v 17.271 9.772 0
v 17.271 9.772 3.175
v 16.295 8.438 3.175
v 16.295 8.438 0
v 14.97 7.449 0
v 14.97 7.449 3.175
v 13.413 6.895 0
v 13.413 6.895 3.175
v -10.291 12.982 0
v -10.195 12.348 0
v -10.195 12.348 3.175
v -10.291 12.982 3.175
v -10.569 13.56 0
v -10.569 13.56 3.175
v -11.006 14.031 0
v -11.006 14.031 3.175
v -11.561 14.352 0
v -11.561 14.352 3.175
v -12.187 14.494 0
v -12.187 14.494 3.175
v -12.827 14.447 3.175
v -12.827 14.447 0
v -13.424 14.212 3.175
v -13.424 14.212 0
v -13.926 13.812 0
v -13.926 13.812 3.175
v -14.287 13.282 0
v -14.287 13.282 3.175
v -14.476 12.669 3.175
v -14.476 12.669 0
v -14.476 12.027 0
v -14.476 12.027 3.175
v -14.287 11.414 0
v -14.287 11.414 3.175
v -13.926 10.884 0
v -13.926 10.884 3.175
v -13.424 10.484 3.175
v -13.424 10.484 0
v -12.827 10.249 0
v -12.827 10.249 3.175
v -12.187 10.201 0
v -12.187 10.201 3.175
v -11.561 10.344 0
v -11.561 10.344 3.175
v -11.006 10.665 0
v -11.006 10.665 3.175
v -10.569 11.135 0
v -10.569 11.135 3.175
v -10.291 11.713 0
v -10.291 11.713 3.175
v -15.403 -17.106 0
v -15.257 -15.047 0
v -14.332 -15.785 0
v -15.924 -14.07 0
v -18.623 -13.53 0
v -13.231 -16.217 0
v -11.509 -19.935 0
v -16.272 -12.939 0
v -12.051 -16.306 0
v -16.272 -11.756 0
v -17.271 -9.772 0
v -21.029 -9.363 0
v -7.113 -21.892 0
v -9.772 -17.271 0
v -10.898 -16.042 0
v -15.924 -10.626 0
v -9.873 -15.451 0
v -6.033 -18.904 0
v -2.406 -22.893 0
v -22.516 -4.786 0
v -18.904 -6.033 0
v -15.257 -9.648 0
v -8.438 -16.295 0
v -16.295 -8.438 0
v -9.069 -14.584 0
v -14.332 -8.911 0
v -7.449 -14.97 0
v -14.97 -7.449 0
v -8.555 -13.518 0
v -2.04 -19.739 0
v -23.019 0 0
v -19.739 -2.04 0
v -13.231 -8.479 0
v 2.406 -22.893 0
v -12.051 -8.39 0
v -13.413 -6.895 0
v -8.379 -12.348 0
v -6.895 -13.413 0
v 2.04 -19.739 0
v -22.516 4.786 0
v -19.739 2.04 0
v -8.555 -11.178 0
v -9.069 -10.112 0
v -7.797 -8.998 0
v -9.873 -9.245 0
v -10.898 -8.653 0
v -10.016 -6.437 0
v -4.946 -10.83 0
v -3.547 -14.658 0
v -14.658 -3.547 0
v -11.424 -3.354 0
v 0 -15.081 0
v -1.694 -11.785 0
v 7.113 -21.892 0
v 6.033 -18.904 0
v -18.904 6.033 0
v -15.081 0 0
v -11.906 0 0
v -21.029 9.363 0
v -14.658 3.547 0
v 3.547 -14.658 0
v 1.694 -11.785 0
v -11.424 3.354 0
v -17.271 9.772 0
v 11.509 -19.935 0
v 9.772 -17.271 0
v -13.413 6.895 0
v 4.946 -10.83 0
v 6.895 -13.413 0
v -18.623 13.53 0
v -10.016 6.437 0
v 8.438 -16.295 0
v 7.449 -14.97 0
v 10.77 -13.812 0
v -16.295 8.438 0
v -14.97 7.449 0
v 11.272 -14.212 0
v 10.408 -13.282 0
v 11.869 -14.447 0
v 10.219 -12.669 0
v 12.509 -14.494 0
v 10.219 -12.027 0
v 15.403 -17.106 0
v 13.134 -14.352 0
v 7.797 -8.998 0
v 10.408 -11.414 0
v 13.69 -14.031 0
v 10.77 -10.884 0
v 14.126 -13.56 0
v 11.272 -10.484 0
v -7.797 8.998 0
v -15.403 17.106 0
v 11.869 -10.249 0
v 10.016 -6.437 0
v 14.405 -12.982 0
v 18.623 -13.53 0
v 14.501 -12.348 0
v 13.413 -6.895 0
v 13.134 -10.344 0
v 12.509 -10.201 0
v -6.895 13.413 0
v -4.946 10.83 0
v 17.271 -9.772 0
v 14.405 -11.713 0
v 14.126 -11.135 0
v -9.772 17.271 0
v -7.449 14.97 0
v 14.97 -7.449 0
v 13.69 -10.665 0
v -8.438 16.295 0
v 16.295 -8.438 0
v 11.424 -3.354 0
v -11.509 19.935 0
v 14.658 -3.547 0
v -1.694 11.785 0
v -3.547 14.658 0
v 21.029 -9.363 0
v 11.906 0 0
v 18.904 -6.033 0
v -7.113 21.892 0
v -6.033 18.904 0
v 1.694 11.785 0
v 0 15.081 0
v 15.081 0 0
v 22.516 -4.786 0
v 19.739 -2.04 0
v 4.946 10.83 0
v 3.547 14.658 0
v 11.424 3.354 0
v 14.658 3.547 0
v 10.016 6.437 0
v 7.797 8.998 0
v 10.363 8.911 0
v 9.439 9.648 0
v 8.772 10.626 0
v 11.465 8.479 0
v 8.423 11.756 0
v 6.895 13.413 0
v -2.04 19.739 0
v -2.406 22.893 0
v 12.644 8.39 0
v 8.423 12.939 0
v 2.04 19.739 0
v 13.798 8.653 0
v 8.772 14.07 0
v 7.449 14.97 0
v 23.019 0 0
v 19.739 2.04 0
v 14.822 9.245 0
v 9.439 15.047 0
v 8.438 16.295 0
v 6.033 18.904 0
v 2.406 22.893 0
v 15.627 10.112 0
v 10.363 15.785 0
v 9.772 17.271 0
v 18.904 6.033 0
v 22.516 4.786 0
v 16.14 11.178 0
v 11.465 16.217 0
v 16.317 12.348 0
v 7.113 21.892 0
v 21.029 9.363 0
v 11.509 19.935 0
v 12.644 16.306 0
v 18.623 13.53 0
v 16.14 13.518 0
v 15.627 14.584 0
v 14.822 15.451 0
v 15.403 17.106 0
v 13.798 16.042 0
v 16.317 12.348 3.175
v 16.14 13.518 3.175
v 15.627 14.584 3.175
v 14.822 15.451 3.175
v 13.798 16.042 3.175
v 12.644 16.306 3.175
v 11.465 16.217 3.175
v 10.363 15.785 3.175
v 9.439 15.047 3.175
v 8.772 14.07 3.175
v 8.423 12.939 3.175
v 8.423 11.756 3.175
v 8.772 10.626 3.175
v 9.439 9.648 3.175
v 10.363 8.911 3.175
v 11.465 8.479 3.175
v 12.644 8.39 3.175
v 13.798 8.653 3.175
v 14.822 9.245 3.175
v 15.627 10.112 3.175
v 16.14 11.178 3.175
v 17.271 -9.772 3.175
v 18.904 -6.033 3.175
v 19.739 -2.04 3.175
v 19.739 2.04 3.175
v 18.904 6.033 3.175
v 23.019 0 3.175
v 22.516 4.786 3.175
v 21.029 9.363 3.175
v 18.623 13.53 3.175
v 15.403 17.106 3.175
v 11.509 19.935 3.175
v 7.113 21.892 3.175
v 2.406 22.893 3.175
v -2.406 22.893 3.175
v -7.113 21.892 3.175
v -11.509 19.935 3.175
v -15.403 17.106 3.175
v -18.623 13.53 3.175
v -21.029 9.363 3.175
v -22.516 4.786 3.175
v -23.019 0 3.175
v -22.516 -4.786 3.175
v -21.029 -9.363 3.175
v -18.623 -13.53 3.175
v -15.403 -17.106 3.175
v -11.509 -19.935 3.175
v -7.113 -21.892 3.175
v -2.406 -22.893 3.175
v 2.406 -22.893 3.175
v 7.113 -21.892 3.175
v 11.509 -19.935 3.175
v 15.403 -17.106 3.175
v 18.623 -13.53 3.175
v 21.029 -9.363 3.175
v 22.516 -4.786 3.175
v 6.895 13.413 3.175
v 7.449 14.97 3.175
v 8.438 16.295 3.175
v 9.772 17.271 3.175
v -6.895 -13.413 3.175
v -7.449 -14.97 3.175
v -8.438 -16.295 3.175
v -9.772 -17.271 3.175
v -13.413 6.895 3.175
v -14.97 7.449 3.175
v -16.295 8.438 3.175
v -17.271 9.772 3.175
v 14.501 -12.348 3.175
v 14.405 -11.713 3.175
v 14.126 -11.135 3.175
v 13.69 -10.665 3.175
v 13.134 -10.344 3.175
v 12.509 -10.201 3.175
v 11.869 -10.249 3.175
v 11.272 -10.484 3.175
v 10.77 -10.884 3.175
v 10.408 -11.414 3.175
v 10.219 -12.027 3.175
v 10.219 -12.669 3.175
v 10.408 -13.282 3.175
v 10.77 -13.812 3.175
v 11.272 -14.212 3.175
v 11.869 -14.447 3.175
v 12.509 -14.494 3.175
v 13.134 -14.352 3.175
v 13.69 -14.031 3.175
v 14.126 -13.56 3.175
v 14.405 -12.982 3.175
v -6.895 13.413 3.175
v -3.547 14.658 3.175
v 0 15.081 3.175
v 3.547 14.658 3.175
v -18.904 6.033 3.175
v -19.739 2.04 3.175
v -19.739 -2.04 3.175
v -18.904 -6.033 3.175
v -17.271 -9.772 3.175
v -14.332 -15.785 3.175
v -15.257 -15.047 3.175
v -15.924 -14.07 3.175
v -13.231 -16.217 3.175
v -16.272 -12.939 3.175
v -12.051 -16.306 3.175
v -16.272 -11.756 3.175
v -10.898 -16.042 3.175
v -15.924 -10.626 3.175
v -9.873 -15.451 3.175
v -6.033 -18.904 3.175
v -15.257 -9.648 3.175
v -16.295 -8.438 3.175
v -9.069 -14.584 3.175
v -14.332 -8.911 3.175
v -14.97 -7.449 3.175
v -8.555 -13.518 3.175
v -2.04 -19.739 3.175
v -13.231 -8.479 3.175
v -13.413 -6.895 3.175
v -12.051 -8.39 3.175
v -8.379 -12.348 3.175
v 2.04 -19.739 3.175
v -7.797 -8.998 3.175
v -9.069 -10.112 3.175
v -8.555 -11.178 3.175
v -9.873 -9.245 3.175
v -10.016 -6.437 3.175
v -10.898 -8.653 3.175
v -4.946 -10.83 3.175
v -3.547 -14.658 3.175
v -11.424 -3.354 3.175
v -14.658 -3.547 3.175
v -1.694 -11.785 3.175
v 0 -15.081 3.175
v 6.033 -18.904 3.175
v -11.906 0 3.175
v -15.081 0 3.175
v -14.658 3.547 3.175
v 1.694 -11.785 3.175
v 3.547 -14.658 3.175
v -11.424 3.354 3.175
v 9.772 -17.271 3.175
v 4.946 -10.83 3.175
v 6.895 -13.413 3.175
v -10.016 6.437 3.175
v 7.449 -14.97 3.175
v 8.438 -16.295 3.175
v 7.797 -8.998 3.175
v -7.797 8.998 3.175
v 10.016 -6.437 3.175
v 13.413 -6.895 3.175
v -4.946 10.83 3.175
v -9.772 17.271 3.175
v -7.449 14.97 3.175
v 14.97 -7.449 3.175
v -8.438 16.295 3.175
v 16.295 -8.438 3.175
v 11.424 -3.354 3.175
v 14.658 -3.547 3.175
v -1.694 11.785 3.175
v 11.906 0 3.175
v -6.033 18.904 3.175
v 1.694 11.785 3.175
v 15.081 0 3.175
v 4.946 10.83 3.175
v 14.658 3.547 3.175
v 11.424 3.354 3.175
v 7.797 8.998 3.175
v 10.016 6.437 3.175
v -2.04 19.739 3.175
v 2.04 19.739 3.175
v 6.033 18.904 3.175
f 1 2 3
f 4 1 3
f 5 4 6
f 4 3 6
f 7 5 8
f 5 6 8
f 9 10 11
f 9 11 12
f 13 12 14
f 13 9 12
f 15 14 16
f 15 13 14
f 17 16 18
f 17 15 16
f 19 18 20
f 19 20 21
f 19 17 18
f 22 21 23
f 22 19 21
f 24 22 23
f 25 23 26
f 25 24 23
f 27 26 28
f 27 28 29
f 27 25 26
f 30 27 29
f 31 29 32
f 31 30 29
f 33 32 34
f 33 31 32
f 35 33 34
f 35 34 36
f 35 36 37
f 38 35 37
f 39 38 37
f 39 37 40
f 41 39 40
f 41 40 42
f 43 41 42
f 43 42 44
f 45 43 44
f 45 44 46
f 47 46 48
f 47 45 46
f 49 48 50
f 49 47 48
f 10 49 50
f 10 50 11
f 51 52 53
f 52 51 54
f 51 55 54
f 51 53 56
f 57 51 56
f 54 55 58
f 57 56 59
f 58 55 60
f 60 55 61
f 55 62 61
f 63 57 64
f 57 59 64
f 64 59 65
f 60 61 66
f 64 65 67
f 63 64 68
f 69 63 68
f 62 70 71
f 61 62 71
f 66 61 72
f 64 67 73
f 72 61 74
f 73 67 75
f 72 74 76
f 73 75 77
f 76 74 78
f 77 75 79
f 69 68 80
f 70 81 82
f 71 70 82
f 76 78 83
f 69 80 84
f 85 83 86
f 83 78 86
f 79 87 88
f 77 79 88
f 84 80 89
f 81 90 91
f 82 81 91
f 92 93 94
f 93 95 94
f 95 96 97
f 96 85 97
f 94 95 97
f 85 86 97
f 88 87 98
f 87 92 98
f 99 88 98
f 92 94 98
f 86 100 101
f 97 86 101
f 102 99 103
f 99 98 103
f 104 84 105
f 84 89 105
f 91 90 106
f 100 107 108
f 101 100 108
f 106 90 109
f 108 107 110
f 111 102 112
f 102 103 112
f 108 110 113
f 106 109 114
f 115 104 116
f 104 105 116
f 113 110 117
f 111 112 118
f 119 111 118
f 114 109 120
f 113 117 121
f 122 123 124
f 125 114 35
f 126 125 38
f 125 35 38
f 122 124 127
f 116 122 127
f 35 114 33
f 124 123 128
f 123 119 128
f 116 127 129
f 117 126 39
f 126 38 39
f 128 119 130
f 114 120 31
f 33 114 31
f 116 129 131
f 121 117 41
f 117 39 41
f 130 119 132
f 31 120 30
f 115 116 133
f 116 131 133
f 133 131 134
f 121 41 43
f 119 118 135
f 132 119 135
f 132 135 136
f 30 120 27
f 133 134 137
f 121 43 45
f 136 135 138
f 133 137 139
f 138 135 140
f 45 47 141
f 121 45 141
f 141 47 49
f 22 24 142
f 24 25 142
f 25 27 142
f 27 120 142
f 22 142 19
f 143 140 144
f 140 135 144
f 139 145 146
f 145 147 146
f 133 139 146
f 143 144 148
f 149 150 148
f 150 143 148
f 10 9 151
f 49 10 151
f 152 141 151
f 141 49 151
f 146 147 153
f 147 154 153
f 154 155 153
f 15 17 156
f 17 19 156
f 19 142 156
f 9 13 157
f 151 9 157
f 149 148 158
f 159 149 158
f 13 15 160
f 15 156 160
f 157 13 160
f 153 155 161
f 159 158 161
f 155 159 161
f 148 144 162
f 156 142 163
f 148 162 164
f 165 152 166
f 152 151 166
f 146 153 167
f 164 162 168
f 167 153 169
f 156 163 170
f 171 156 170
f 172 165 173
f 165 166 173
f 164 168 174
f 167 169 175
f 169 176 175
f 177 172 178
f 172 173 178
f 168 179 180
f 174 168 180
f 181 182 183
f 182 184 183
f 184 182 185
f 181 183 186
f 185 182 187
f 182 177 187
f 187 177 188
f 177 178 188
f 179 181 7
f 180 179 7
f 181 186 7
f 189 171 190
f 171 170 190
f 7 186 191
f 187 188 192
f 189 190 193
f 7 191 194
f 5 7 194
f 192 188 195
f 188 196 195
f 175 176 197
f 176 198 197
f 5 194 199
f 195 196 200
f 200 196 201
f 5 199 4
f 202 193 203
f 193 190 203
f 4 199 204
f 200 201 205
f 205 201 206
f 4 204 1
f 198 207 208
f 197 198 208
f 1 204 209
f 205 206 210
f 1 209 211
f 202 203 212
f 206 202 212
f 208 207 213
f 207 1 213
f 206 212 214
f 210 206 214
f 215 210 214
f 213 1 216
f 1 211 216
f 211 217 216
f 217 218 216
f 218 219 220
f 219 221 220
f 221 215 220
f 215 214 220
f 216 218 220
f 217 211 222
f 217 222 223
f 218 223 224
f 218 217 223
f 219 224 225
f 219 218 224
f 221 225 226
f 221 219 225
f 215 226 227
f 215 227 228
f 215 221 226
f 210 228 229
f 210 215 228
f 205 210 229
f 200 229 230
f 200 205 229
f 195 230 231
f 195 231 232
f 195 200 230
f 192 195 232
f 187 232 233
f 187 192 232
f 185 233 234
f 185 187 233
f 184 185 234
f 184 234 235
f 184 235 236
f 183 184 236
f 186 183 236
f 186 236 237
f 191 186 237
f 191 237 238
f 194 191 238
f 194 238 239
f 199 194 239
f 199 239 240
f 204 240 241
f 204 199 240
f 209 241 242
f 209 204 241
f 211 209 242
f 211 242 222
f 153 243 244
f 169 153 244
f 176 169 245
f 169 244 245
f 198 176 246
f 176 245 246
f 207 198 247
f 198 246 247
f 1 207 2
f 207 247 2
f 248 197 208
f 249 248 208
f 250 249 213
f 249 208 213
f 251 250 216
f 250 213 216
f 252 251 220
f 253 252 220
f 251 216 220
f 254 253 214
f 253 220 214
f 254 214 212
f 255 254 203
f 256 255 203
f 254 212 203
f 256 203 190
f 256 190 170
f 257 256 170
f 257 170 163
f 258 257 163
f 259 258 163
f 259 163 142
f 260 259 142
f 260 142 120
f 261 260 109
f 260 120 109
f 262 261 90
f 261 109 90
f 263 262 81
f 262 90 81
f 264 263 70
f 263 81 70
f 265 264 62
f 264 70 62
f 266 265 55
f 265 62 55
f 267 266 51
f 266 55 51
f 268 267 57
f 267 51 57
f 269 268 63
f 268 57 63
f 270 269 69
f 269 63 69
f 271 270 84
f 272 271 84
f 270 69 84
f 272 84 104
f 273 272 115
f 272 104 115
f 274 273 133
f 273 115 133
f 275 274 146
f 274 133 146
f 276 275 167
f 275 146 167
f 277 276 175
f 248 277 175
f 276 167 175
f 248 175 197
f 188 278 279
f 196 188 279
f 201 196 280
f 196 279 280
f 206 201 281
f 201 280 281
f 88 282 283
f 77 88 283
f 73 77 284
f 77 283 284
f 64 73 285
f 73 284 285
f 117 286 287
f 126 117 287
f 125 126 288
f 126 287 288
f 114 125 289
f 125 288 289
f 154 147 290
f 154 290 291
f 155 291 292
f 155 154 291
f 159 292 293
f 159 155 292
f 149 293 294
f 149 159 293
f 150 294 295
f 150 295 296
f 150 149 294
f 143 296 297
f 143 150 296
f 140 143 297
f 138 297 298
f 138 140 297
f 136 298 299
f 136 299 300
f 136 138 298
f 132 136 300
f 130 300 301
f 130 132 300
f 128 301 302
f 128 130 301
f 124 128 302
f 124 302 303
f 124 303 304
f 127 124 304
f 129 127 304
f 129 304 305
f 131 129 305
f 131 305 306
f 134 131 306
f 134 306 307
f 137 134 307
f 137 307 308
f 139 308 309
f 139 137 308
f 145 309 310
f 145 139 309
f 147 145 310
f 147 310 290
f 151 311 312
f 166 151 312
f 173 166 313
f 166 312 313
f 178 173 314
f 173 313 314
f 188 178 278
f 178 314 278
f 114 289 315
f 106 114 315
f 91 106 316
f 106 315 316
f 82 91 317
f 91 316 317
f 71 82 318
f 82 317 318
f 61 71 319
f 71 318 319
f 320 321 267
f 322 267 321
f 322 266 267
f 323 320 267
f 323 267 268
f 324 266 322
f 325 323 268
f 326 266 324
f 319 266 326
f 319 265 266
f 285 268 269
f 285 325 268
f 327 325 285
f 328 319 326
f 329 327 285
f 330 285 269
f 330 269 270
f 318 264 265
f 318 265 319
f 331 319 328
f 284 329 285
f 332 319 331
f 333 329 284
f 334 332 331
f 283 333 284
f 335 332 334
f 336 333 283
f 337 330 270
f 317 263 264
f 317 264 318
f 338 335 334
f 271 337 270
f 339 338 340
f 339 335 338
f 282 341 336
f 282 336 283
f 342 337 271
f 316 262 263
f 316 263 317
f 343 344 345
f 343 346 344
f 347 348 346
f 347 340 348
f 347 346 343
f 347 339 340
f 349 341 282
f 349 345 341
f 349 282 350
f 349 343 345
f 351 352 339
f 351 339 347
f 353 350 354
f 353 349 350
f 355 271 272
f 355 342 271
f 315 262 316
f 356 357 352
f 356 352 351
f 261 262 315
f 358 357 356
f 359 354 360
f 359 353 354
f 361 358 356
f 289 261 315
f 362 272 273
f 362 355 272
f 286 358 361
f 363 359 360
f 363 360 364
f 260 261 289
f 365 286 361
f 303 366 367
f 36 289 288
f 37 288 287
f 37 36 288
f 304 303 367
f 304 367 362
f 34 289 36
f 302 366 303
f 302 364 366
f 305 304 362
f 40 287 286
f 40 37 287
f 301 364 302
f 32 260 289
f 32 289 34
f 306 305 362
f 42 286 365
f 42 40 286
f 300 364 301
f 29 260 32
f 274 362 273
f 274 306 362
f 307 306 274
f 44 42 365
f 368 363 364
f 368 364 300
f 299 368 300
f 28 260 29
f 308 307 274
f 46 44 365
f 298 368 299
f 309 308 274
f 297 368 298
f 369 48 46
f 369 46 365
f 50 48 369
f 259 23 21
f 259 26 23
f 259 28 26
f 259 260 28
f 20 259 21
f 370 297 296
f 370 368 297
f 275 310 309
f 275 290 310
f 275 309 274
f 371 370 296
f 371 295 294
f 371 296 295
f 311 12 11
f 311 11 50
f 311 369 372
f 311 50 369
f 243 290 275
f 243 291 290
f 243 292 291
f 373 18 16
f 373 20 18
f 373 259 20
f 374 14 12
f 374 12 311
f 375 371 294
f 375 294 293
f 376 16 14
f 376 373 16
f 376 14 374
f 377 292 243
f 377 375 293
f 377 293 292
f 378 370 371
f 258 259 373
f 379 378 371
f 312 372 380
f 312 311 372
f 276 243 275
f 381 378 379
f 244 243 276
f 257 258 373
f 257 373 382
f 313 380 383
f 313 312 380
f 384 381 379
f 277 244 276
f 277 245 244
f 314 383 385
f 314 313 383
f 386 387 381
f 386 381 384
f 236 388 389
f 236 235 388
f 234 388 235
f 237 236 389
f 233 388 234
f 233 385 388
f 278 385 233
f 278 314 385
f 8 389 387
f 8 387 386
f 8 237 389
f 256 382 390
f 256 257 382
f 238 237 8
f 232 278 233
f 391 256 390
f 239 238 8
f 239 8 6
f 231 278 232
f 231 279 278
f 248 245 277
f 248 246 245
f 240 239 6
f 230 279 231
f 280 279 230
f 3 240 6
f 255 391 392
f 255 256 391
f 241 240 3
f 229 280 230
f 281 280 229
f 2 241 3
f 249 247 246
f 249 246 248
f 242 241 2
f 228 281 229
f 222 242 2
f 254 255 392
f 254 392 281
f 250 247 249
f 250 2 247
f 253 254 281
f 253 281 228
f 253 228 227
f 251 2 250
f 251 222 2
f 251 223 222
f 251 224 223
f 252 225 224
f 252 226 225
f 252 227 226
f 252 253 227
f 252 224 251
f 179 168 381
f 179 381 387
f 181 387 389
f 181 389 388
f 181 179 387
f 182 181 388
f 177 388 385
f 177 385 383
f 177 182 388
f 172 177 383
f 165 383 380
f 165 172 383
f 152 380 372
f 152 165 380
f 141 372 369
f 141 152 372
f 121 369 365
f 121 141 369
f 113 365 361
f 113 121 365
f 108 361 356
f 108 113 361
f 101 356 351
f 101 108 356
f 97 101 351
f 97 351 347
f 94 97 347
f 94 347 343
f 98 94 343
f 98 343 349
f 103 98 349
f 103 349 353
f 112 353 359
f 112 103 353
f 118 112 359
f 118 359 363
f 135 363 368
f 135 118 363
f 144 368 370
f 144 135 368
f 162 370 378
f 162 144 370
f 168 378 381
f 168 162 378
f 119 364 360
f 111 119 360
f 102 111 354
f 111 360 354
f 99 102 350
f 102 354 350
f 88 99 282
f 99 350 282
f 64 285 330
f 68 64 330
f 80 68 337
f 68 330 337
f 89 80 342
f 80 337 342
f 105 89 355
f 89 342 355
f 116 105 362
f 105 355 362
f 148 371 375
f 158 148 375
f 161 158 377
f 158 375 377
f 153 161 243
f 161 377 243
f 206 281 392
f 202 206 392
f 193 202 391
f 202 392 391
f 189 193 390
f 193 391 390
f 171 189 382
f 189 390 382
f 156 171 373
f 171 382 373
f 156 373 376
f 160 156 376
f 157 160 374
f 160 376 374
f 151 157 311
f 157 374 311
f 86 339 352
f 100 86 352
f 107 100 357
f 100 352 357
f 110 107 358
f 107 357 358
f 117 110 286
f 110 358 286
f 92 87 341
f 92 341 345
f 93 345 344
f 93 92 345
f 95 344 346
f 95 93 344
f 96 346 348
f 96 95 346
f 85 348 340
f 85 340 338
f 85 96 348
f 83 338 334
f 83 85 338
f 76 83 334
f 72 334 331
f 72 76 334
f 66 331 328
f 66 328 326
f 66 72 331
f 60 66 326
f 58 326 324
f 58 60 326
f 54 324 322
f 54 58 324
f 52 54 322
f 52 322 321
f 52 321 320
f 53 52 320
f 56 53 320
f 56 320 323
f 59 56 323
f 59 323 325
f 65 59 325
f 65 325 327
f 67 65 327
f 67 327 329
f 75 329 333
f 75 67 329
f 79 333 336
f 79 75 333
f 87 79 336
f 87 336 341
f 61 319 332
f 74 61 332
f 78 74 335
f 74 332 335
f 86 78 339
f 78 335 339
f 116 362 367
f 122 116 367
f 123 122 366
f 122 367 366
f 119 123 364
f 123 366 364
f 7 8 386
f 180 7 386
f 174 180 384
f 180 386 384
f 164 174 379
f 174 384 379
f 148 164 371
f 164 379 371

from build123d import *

# Parameters (mm, degrees)
F0_R     = 23.01875
F0_R_2   = 3.96875
F0_R_3   = 2.15265
F0_R_4   = 11.90625
F1_DEPTH = 3.175
F3_DEPTH = 3.175


with BuildPart() as f1:
    # F0 (on Top) → F1 (new body)
    with BuildSketch(Plane.XY):
        Circle(F0_R)
        with Locations((-12.347852, -12.347852)):
            Circle(F0_R_2, mode=Mode.SUBTRACT)
        with Locations((12.347852, -12.347852)):
            Circle(F0_R_3, mode=Mode.SUBTRACT)
        with Locations((-12.347852, 12.347852)):
            Circle(F0_R_3, mode=Mode.SUBTRACT)
        Circle(F0_R_4, mode=Mode.SUBTRACT)
        with Locations((12.347852, 12.347852)):
            Circle(F0_R_2, mode=Mode.SUBTRACT)
    extrude(amount=F1_DEPTH)

    # F2 (on face) → F3 (cut, through all)
    with BuildSketch(Plane.XY.offset(3.175)):
        with BuildLine():
            ThreePointArc((-9.771912, 17.270905), (-7.8939, 15.669632), (-6.894649, 13.412976))
            ThreePointArc((-6.894649, 13.412976), (0, 15.08125), (6.894649, 13.412976))
            ThreePointArc((6.894649, 13.412976), (7.8939, 15.669632), (9.771912, 17.270905))
            ThreePointArc((9.771912, 17.270905), (0, 19.84375), (-9.771912, 17.270905))
        make_face()
        with BuildLine():
            ThreePointArc((-13.412976, 6.894649), (-15.669632, 7.8939), (-17.270905, 9.771912))
            ThreePointArc((-17.270905, 9.771912), (-19.84375, 0), (-17.270905, -9.771912))
            ThreePointArc((-17.270905, -9.771912), (-15.669632, -7.8939), (-13.412976, -6.894649))
            ThreePointArc((-13.412976, -6.894649), (-15.08125, 0), (-13.412976, 6.894649))
        make_face()
        with BuildLine():
            ThreePointArc((17.270905, 9.771912), (15.669632, 7.8939), (13.412976, 6.894649))
            ThreePointArc((13.412976, 6.894649), (15.08125, 0), (13.412976, -6.894649))
            ThreePointArc((13.412976, -6.894649), (15.669632, -7.8939), (17.270905, -9.771912))
            ThreePointArc((17.270905, -9.771912), (19.84375, 0), (17.270905, 9.771912))
        make_face()
        with BuildLine():
            ThreePointArc((-6.894649, -13.412976), (-7.8939, -15.669632), (-9.771912, -17.270905))
            ThreePointArc((-9.771912, -17.270905), (0, -19.84375), (9.771912, -17.270905))
            ThreePointArc((9.771912, -17.270905), (7.8939, -15.669632), (6.894649, -13.412976))
            ThreePointArc((6.894649, -13.412976), (0, -15.08125), (-6.894649, -13.412976))
        make_face()
    extrude(amount=-F3_DEPTH, mode=Mode.SUBTRACT)


solid = f1.part
